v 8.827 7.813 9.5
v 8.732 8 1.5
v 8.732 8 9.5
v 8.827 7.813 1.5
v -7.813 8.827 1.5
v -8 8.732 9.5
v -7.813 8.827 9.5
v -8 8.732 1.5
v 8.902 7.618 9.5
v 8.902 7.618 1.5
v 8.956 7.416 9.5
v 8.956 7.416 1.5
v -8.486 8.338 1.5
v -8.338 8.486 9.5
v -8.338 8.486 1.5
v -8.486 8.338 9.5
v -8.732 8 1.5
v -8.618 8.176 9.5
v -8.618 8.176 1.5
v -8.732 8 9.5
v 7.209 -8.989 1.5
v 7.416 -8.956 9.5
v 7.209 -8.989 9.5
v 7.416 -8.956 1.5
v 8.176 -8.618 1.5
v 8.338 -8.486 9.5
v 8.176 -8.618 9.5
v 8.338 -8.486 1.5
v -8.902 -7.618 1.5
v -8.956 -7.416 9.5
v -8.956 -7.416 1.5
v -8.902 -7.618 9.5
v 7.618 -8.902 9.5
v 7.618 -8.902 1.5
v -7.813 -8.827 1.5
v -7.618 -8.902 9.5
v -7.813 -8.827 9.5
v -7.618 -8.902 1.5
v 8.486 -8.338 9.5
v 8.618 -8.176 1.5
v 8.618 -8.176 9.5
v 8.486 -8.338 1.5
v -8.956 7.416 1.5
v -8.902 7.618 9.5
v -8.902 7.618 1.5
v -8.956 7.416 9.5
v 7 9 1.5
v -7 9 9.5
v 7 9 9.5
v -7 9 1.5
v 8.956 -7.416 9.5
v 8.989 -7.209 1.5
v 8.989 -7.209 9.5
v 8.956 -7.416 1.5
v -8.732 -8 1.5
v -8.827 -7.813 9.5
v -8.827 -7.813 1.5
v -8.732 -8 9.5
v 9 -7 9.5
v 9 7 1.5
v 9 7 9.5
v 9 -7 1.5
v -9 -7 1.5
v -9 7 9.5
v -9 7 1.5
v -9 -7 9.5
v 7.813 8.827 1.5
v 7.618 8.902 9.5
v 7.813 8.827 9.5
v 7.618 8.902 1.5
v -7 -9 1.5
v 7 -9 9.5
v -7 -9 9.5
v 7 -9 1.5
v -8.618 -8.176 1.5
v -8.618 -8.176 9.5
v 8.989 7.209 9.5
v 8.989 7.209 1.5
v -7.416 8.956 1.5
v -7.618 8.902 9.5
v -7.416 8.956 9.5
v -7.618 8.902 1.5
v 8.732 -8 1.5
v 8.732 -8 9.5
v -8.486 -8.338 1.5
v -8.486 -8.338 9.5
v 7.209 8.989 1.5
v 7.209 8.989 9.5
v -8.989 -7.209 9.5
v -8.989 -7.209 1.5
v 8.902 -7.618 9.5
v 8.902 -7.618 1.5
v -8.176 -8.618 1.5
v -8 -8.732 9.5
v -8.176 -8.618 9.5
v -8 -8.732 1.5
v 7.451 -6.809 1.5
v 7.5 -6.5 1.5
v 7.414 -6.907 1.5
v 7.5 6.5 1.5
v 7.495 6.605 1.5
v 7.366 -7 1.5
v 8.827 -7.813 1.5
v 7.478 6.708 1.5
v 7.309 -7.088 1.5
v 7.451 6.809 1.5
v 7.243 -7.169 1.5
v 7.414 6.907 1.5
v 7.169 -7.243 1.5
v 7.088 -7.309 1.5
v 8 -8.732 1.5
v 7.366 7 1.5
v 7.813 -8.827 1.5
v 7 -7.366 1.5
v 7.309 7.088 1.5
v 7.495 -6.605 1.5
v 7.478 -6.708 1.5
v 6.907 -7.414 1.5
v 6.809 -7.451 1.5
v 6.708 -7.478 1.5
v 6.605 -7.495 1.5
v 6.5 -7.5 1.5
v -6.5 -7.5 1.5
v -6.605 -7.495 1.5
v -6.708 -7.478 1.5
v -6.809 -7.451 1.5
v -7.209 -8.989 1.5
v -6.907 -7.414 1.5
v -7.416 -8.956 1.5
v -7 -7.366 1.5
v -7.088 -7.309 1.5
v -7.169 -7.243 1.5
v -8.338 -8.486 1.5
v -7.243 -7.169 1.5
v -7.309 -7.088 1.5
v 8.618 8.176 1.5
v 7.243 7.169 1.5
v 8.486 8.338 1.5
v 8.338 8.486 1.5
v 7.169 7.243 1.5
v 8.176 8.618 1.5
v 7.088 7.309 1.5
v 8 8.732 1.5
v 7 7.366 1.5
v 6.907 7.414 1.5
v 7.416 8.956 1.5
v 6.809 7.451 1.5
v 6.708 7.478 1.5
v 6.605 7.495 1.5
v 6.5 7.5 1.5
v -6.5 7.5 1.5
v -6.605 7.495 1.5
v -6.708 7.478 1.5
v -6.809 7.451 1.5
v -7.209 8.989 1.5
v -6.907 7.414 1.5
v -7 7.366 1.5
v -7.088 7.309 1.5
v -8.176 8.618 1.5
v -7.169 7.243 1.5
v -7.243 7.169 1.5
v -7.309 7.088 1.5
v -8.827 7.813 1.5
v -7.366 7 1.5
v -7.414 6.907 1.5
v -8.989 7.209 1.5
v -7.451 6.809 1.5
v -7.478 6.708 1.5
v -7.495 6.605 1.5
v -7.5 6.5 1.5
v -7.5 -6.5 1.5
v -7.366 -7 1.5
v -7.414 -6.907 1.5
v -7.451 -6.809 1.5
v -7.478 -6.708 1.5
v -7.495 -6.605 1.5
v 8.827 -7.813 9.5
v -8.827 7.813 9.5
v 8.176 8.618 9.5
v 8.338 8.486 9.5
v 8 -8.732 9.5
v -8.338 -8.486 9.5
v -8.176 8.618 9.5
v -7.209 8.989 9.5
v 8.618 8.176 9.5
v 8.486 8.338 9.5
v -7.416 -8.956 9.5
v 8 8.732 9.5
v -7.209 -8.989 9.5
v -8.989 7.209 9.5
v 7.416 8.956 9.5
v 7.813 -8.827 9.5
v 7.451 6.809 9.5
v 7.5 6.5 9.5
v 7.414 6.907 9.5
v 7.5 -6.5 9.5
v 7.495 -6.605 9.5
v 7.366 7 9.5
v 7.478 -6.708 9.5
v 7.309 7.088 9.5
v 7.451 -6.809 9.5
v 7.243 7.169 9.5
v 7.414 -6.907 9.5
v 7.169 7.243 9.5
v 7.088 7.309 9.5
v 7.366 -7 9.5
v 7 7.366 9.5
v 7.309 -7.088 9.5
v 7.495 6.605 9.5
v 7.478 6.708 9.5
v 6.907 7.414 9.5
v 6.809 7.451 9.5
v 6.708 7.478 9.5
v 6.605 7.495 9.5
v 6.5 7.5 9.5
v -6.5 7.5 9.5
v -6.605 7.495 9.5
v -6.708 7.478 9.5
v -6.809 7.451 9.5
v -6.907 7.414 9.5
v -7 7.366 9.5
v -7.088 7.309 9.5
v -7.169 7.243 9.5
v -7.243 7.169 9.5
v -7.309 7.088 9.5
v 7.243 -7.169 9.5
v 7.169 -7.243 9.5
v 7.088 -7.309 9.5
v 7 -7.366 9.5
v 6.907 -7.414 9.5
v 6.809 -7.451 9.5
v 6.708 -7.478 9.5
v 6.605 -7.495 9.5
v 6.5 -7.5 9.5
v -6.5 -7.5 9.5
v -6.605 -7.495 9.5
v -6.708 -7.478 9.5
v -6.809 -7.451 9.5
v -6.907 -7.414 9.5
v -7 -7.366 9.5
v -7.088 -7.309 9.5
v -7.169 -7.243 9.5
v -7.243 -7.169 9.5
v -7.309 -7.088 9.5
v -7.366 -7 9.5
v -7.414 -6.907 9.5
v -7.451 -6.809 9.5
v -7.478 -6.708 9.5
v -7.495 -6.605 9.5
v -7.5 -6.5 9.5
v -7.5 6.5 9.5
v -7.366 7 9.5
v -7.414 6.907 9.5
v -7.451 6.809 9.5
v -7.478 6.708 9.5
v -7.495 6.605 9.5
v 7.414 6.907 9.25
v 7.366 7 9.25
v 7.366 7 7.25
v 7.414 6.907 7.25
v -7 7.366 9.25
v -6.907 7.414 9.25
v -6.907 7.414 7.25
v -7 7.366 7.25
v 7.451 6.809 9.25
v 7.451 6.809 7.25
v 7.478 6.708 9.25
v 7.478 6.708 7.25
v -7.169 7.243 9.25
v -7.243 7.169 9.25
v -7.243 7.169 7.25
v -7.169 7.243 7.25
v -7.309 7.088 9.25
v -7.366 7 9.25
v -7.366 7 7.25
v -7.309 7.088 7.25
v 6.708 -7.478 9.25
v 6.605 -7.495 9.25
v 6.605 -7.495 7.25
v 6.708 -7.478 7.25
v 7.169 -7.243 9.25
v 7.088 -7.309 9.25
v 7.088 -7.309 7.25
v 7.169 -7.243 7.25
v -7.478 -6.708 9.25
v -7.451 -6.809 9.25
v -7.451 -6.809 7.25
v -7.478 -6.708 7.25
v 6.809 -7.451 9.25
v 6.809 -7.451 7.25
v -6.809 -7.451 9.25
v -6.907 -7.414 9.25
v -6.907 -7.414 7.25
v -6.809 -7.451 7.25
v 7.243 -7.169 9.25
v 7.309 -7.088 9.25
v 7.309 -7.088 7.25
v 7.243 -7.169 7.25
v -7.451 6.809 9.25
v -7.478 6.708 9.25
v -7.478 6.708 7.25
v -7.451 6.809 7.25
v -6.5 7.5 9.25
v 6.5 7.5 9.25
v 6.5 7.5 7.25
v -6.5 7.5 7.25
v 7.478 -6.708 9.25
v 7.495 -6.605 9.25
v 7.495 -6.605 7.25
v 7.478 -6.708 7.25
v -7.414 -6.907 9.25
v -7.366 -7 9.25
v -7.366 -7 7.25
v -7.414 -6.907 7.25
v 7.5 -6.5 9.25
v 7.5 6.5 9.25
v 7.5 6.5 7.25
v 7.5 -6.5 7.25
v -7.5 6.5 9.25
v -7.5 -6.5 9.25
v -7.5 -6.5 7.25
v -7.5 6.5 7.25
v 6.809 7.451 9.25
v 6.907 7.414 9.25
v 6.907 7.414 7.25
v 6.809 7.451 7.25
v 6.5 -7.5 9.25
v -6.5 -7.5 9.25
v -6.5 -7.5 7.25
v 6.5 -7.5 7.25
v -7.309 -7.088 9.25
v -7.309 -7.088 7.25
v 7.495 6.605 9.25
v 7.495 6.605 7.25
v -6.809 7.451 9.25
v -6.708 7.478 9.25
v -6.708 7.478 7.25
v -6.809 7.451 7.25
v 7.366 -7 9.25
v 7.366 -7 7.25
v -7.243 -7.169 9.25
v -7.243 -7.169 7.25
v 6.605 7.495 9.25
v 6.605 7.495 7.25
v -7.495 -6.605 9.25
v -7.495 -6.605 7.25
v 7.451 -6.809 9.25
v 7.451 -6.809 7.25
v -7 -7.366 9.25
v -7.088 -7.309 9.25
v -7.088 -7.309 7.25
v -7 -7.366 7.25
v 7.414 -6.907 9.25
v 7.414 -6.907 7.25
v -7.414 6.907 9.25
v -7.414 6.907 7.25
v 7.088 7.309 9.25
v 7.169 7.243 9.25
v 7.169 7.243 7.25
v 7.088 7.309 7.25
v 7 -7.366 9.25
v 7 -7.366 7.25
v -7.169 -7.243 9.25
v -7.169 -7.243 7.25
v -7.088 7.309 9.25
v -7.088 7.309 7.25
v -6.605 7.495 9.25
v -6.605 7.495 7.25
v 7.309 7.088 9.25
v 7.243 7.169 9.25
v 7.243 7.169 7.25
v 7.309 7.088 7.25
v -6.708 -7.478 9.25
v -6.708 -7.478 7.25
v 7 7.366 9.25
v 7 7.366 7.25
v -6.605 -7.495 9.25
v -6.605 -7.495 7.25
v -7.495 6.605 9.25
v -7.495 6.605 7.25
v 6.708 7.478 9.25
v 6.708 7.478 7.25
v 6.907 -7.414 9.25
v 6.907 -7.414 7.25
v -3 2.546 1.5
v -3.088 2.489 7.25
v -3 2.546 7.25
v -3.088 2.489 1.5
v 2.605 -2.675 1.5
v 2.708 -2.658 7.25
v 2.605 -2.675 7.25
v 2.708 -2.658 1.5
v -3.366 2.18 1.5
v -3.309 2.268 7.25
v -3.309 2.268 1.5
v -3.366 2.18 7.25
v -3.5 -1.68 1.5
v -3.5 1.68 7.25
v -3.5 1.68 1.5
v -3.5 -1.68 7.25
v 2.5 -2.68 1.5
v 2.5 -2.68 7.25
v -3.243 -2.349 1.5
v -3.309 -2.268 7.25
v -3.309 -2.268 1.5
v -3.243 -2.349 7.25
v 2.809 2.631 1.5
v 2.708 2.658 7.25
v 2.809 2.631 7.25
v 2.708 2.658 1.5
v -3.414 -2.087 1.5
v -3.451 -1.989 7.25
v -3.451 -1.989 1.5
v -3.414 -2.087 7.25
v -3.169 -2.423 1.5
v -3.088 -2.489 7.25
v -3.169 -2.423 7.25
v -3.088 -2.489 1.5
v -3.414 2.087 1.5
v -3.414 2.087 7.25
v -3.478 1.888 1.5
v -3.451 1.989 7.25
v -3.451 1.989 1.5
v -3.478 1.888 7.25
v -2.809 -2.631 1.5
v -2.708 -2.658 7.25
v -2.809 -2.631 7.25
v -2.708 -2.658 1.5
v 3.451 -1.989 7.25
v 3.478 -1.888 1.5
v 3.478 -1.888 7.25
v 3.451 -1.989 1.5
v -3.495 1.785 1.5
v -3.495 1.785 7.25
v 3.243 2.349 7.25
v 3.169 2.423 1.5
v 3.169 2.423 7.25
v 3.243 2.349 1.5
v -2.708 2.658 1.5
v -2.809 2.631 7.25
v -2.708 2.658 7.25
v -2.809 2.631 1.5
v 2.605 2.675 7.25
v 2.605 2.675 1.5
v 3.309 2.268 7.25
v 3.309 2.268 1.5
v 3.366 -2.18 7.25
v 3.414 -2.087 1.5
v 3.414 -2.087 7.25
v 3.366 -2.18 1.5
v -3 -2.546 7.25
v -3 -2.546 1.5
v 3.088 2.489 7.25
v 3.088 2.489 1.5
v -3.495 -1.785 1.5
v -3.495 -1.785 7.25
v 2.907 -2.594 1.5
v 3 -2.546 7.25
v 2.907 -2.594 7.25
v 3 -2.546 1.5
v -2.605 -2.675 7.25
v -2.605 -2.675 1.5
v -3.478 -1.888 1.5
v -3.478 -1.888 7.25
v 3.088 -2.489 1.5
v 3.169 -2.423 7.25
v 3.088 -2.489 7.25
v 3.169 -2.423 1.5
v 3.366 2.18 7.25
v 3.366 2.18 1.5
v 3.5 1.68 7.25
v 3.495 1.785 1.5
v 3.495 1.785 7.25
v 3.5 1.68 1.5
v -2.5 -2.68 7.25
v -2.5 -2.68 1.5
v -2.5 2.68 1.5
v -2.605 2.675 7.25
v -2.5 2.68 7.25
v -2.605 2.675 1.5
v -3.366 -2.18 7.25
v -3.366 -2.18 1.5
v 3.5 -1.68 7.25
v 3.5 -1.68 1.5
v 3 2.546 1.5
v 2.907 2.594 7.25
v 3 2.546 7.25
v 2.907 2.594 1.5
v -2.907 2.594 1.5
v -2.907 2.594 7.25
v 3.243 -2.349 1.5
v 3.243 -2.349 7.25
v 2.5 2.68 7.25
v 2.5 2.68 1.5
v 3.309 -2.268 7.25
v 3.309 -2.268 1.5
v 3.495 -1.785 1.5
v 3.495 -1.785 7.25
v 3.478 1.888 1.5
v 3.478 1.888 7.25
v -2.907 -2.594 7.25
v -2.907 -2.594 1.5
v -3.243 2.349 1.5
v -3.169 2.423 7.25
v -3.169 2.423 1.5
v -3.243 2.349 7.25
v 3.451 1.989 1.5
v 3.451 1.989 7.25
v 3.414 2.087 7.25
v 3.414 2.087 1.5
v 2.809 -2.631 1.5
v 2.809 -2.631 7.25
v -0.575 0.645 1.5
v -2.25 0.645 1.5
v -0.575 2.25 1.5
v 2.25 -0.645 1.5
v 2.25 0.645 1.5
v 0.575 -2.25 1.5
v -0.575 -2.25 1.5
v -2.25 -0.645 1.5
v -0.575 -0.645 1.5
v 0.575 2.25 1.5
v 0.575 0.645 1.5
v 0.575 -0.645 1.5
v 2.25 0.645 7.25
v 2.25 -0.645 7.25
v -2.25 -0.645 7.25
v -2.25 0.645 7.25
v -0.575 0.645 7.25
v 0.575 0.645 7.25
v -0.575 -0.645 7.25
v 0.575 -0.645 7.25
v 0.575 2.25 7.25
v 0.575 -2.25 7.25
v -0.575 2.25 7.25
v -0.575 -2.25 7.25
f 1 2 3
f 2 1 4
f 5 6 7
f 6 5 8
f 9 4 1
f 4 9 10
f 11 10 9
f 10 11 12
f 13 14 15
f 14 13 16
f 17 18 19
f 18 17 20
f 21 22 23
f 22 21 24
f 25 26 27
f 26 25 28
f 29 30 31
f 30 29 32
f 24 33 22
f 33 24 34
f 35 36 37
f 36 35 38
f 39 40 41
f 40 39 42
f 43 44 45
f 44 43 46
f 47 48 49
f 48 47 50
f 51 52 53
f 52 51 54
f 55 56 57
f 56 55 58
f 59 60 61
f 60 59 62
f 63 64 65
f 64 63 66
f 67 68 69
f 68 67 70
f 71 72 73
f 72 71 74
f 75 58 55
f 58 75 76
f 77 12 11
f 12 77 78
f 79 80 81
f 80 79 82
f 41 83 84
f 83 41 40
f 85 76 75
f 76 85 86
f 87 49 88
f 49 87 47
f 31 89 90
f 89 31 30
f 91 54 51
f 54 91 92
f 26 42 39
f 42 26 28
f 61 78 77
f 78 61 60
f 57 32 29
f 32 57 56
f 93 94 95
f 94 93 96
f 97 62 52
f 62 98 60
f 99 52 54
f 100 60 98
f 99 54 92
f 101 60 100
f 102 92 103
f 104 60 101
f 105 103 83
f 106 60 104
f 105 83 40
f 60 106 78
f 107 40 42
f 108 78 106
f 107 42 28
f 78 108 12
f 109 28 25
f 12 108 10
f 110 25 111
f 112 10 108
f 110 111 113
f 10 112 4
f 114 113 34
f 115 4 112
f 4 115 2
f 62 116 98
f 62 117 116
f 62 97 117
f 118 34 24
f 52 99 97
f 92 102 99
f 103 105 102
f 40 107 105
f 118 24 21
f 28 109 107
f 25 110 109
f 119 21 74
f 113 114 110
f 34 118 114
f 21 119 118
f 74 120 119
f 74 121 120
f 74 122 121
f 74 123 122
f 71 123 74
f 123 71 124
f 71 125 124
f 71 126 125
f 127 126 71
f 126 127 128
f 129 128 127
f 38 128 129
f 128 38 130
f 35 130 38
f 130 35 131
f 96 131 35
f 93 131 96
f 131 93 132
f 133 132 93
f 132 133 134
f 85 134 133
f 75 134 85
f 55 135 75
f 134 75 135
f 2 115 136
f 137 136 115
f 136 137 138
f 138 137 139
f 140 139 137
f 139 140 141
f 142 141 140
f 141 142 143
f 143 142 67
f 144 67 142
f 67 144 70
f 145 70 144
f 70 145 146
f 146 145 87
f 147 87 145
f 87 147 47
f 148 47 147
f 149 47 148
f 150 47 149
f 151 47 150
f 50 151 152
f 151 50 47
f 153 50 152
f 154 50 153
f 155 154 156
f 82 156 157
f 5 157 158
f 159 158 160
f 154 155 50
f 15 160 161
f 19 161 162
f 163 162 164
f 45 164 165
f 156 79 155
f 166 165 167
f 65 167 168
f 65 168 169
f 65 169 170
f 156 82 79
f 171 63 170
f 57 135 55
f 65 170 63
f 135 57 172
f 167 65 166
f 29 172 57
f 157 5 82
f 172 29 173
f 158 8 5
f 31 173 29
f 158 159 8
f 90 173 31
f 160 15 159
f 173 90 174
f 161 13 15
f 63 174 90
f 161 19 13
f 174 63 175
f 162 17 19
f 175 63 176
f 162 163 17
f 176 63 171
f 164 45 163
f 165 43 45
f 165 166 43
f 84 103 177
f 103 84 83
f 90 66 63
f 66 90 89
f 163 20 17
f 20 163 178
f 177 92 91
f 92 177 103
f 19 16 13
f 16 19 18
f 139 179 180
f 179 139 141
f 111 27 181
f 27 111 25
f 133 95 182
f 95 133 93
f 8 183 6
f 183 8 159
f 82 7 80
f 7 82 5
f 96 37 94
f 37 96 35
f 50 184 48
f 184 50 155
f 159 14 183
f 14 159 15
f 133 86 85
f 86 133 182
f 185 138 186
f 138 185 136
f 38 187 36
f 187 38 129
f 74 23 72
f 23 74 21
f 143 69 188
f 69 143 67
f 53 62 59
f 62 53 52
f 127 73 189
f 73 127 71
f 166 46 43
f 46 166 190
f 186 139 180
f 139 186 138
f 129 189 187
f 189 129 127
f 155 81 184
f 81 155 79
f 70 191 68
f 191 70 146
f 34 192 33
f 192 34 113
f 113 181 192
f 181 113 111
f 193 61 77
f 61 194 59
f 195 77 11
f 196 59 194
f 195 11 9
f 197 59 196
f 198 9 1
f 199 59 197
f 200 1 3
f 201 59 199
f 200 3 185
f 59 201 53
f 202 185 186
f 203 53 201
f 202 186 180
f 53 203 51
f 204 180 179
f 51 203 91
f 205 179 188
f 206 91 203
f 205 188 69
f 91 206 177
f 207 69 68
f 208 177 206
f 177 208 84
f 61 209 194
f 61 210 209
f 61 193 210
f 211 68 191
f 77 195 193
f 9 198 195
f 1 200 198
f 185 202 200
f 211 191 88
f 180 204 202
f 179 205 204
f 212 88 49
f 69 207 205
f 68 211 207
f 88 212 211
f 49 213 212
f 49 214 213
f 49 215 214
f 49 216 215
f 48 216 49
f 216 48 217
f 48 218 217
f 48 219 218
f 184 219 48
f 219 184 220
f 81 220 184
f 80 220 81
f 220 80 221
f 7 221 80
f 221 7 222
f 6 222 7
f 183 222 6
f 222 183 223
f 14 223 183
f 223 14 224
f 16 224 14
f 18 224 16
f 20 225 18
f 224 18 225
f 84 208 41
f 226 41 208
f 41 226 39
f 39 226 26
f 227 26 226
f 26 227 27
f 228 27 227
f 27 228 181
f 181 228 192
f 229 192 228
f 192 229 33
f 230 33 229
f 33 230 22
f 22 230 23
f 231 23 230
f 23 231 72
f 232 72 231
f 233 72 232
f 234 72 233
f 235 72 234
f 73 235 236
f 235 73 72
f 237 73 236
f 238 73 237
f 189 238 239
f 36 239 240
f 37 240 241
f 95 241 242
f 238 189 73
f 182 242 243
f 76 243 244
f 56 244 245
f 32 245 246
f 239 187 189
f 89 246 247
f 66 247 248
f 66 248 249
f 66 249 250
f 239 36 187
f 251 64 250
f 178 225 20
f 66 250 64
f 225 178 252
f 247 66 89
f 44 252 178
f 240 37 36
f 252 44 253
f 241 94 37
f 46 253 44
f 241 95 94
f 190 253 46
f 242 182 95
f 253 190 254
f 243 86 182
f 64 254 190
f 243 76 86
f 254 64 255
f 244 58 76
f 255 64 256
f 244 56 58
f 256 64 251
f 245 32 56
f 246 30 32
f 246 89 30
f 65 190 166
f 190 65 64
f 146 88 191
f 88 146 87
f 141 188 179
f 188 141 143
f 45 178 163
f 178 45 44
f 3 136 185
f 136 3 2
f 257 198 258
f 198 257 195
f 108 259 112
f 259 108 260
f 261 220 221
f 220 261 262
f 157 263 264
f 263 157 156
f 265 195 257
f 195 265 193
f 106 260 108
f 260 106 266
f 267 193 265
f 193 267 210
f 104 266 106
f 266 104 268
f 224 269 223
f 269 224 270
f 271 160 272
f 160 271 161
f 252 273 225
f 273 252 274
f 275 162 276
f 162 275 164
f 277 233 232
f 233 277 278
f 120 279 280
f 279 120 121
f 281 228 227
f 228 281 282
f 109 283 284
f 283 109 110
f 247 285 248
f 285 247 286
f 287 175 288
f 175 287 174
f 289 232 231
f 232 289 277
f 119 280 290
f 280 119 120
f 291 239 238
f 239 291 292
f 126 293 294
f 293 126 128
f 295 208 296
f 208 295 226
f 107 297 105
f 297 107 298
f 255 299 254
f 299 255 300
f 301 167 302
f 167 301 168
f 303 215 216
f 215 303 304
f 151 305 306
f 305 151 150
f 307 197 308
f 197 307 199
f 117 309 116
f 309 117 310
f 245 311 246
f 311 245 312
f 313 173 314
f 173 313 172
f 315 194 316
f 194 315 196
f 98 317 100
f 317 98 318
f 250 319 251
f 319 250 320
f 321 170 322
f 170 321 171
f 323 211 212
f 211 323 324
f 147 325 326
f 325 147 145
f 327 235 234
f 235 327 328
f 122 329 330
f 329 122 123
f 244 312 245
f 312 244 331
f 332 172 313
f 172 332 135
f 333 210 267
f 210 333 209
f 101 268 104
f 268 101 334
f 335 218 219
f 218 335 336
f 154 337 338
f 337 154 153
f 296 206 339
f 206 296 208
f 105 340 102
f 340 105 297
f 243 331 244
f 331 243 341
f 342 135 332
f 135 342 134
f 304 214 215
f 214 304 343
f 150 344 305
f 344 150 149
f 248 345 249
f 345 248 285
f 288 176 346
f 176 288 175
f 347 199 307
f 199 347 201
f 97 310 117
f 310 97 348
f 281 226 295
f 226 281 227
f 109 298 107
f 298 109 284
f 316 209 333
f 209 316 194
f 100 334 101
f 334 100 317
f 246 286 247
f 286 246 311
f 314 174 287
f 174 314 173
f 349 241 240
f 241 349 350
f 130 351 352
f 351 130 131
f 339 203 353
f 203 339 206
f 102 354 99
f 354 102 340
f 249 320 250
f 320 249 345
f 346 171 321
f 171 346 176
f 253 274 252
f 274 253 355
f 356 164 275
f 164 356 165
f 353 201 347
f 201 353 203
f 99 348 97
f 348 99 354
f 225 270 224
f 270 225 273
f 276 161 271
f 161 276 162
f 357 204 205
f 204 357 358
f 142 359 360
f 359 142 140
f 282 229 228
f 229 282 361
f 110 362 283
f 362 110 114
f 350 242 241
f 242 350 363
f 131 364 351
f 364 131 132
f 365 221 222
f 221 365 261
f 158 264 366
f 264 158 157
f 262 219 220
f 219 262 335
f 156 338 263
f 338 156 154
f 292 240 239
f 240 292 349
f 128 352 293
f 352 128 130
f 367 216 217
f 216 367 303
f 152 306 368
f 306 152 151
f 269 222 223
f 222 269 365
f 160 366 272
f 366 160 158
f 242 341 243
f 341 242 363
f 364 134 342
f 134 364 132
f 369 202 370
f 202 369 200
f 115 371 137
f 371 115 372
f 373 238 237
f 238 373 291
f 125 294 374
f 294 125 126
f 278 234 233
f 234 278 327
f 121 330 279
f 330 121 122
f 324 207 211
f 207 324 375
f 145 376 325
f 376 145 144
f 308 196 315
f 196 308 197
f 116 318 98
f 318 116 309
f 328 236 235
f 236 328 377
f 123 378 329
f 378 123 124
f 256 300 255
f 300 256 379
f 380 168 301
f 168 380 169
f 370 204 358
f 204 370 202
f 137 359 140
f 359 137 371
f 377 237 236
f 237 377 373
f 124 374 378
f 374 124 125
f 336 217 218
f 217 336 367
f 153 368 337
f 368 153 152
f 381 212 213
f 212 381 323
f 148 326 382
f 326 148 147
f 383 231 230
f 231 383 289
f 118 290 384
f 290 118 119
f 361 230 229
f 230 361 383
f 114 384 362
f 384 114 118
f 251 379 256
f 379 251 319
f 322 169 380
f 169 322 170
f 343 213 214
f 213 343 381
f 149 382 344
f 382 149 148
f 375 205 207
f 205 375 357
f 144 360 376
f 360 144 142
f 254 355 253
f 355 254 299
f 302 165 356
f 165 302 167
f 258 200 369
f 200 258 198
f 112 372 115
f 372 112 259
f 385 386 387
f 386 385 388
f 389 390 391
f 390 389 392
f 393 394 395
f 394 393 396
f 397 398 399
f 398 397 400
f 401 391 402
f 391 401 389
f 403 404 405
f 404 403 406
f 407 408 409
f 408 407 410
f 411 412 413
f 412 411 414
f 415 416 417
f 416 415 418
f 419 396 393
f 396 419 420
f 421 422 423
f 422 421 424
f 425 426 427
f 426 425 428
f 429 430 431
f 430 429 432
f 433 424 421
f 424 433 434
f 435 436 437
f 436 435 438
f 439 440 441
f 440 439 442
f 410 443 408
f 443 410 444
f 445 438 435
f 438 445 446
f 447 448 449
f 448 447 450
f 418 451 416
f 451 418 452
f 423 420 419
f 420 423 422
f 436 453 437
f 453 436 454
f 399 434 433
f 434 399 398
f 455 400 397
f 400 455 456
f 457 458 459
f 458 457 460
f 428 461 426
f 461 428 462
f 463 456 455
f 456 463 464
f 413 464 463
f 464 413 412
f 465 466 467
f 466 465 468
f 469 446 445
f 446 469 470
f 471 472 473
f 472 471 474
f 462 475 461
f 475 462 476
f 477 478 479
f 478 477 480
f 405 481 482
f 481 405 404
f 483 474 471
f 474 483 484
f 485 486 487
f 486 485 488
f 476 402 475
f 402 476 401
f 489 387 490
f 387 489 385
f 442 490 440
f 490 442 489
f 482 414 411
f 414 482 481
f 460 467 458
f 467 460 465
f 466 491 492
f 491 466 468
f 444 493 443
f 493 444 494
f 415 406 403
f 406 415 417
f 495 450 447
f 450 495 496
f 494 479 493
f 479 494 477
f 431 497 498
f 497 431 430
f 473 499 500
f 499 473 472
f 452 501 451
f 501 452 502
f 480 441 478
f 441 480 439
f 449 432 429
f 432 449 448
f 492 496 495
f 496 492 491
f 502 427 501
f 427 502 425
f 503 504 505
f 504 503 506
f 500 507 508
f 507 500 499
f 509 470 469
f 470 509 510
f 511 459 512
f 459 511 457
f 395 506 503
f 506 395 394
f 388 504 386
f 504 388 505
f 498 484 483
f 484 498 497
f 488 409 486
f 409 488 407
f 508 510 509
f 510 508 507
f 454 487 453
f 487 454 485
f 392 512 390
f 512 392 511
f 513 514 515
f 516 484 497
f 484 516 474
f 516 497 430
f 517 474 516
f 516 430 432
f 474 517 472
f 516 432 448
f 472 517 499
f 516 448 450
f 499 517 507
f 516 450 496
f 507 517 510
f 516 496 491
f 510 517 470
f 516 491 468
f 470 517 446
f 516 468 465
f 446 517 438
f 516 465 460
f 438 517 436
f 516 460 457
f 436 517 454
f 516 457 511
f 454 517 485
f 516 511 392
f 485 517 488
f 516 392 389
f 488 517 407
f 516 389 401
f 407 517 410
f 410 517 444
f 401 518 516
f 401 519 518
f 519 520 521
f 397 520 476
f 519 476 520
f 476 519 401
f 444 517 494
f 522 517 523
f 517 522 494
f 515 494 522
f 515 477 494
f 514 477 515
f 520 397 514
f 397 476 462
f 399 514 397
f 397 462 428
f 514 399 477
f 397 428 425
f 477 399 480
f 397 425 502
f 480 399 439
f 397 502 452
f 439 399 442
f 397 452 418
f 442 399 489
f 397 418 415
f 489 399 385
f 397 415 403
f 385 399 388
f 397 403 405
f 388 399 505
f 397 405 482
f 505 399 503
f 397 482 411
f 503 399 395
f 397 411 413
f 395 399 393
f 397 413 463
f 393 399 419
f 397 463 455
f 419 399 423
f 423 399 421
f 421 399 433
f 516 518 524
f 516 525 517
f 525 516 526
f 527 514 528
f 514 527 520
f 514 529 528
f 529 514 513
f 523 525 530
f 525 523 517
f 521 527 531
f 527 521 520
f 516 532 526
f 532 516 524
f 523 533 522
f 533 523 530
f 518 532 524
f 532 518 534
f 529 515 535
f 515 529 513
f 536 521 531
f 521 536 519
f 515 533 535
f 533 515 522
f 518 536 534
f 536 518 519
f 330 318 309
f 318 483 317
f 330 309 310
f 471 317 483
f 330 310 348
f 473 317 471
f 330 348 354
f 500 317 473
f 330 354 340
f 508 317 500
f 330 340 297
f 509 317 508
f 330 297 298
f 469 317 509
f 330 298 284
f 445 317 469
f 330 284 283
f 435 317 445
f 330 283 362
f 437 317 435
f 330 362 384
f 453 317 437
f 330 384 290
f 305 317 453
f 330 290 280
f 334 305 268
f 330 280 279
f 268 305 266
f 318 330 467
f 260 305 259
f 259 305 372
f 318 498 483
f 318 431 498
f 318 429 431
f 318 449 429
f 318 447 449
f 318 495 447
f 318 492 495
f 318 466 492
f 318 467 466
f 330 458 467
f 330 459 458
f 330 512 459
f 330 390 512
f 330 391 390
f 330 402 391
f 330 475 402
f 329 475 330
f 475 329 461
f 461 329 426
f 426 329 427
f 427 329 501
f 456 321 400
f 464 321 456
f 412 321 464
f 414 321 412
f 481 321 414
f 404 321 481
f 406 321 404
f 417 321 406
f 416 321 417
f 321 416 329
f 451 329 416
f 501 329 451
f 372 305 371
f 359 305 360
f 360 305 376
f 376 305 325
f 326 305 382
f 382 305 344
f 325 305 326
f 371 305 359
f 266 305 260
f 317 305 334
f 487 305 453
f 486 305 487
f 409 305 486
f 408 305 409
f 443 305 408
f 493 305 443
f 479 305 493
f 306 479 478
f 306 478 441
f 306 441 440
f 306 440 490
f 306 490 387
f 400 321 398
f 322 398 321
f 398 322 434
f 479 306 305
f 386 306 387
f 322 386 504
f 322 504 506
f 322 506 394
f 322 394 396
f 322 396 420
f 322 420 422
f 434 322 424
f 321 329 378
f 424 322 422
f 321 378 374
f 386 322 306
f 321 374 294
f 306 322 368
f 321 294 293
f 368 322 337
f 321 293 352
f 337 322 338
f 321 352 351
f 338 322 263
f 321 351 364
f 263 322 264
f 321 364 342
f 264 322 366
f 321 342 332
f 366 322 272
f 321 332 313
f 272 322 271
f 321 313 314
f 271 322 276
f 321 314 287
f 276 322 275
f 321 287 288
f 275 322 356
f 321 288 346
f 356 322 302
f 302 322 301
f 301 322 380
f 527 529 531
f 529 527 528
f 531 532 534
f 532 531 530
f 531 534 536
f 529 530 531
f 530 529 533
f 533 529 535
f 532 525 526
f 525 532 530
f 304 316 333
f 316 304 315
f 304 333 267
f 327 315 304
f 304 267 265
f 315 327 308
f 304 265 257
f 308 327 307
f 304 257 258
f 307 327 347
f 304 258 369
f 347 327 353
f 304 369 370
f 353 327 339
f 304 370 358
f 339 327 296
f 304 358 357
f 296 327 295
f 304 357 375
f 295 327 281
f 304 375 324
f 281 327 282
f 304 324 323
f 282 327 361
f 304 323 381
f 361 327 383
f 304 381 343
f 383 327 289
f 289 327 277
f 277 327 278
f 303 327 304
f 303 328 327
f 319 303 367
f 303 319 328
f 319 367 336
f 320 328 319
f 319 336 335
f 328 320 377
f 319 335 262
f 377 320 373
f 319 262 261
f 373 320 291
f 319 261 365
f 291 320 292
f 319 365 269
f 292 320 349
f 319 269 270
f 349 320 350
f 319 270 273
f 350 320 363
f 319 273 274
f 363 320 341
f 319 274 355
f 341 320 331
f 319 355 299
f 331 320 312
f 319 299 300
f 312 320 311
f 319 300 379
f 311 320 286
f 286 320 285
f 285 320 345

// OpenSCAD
// Define higher resolution for transformations
$fn=60;

difference() {
union(){
    // sides
    color("#FFA500")
    difference() {
        translate([0,0,1.5])  sideroundedcube(18, 8, 2);
        translate([0,0,1.49]) sideroundedcube(15, 10, 1);
    }
    // top ceiling
    color("#FF8C00")
    translate([0,0,7.25]) sideroundedcube(15, 2, 1);

    // fitting support
    color("#FF7F50")
    translate([0, 0, 4.75])
    difference(){
        // housing fitting
        hull() {
            translate([2.50, 1.68, 0])   cylinder(6.5, 1, 1, true);
            translate([-2.50, 1.68, 0])  cylinder(6.5, 1, 1, true);
            translate([2.50, -1.68, 0])  cylinder(6.5, 1, 1, true);
            translate([-2.50, -1.68, 0]) cylinder(6.5, 1, 1, true);
        }
        // cross fitting cutoff
        cube([4.5, 1.29, 10], true);
        cube([1.15, 4.5, 10], true);
    }
}

    *color("#666666")
    translate([-7,0, 9])
    linear_extrude(1)
    text("A", font="Courier New", size=8);

// enable to see sliced
*translate([0, 5, 5]) cube([20, 10, 20], true);
}

// reference inner cupola cutoff
*translate([10,10,1.49])
sideroundedcube(16, 6, 2);

// height reference, with z offset for switch spacing
*translate([0,0,1.5])
cube([18, 18, 8]); // height = 8mm


/**
 * Reference fitting cross
 * The fitting cross on the kailh speed has been measured to be:
 * - horizontal : 1.27 to 1.29 thick, 3.95 in length, and 3.65 in height
 * - vertical   : 1.11 to 1.15 think, 3.95 in length, and 3.65 in height
 */
*union(){
    cube([3.95, 1.29, 3.66], true); // h
    cube([1.15, 3.94, 3.66], true); // v
 }

/**
 * Reference piston housing
 * The piston housing on the kailh speed has been measured to be:
 * - x : 7.47
 * - y : 5.81
 * - z : 3.65
 */
*cube([7.45, 5.8, 3.65], true);


module roundedcube(s, h, r) {
    minkowski() {
        cube([s-r*2, s-r*2, h-r*2], true);
        sphere(r);
    };
}

module sideroundedcube(s, h, r) {
    linear_extrude(height=h)
    minkowski() {
        square(s-r*2, true);
        circle(r);
    };
}
